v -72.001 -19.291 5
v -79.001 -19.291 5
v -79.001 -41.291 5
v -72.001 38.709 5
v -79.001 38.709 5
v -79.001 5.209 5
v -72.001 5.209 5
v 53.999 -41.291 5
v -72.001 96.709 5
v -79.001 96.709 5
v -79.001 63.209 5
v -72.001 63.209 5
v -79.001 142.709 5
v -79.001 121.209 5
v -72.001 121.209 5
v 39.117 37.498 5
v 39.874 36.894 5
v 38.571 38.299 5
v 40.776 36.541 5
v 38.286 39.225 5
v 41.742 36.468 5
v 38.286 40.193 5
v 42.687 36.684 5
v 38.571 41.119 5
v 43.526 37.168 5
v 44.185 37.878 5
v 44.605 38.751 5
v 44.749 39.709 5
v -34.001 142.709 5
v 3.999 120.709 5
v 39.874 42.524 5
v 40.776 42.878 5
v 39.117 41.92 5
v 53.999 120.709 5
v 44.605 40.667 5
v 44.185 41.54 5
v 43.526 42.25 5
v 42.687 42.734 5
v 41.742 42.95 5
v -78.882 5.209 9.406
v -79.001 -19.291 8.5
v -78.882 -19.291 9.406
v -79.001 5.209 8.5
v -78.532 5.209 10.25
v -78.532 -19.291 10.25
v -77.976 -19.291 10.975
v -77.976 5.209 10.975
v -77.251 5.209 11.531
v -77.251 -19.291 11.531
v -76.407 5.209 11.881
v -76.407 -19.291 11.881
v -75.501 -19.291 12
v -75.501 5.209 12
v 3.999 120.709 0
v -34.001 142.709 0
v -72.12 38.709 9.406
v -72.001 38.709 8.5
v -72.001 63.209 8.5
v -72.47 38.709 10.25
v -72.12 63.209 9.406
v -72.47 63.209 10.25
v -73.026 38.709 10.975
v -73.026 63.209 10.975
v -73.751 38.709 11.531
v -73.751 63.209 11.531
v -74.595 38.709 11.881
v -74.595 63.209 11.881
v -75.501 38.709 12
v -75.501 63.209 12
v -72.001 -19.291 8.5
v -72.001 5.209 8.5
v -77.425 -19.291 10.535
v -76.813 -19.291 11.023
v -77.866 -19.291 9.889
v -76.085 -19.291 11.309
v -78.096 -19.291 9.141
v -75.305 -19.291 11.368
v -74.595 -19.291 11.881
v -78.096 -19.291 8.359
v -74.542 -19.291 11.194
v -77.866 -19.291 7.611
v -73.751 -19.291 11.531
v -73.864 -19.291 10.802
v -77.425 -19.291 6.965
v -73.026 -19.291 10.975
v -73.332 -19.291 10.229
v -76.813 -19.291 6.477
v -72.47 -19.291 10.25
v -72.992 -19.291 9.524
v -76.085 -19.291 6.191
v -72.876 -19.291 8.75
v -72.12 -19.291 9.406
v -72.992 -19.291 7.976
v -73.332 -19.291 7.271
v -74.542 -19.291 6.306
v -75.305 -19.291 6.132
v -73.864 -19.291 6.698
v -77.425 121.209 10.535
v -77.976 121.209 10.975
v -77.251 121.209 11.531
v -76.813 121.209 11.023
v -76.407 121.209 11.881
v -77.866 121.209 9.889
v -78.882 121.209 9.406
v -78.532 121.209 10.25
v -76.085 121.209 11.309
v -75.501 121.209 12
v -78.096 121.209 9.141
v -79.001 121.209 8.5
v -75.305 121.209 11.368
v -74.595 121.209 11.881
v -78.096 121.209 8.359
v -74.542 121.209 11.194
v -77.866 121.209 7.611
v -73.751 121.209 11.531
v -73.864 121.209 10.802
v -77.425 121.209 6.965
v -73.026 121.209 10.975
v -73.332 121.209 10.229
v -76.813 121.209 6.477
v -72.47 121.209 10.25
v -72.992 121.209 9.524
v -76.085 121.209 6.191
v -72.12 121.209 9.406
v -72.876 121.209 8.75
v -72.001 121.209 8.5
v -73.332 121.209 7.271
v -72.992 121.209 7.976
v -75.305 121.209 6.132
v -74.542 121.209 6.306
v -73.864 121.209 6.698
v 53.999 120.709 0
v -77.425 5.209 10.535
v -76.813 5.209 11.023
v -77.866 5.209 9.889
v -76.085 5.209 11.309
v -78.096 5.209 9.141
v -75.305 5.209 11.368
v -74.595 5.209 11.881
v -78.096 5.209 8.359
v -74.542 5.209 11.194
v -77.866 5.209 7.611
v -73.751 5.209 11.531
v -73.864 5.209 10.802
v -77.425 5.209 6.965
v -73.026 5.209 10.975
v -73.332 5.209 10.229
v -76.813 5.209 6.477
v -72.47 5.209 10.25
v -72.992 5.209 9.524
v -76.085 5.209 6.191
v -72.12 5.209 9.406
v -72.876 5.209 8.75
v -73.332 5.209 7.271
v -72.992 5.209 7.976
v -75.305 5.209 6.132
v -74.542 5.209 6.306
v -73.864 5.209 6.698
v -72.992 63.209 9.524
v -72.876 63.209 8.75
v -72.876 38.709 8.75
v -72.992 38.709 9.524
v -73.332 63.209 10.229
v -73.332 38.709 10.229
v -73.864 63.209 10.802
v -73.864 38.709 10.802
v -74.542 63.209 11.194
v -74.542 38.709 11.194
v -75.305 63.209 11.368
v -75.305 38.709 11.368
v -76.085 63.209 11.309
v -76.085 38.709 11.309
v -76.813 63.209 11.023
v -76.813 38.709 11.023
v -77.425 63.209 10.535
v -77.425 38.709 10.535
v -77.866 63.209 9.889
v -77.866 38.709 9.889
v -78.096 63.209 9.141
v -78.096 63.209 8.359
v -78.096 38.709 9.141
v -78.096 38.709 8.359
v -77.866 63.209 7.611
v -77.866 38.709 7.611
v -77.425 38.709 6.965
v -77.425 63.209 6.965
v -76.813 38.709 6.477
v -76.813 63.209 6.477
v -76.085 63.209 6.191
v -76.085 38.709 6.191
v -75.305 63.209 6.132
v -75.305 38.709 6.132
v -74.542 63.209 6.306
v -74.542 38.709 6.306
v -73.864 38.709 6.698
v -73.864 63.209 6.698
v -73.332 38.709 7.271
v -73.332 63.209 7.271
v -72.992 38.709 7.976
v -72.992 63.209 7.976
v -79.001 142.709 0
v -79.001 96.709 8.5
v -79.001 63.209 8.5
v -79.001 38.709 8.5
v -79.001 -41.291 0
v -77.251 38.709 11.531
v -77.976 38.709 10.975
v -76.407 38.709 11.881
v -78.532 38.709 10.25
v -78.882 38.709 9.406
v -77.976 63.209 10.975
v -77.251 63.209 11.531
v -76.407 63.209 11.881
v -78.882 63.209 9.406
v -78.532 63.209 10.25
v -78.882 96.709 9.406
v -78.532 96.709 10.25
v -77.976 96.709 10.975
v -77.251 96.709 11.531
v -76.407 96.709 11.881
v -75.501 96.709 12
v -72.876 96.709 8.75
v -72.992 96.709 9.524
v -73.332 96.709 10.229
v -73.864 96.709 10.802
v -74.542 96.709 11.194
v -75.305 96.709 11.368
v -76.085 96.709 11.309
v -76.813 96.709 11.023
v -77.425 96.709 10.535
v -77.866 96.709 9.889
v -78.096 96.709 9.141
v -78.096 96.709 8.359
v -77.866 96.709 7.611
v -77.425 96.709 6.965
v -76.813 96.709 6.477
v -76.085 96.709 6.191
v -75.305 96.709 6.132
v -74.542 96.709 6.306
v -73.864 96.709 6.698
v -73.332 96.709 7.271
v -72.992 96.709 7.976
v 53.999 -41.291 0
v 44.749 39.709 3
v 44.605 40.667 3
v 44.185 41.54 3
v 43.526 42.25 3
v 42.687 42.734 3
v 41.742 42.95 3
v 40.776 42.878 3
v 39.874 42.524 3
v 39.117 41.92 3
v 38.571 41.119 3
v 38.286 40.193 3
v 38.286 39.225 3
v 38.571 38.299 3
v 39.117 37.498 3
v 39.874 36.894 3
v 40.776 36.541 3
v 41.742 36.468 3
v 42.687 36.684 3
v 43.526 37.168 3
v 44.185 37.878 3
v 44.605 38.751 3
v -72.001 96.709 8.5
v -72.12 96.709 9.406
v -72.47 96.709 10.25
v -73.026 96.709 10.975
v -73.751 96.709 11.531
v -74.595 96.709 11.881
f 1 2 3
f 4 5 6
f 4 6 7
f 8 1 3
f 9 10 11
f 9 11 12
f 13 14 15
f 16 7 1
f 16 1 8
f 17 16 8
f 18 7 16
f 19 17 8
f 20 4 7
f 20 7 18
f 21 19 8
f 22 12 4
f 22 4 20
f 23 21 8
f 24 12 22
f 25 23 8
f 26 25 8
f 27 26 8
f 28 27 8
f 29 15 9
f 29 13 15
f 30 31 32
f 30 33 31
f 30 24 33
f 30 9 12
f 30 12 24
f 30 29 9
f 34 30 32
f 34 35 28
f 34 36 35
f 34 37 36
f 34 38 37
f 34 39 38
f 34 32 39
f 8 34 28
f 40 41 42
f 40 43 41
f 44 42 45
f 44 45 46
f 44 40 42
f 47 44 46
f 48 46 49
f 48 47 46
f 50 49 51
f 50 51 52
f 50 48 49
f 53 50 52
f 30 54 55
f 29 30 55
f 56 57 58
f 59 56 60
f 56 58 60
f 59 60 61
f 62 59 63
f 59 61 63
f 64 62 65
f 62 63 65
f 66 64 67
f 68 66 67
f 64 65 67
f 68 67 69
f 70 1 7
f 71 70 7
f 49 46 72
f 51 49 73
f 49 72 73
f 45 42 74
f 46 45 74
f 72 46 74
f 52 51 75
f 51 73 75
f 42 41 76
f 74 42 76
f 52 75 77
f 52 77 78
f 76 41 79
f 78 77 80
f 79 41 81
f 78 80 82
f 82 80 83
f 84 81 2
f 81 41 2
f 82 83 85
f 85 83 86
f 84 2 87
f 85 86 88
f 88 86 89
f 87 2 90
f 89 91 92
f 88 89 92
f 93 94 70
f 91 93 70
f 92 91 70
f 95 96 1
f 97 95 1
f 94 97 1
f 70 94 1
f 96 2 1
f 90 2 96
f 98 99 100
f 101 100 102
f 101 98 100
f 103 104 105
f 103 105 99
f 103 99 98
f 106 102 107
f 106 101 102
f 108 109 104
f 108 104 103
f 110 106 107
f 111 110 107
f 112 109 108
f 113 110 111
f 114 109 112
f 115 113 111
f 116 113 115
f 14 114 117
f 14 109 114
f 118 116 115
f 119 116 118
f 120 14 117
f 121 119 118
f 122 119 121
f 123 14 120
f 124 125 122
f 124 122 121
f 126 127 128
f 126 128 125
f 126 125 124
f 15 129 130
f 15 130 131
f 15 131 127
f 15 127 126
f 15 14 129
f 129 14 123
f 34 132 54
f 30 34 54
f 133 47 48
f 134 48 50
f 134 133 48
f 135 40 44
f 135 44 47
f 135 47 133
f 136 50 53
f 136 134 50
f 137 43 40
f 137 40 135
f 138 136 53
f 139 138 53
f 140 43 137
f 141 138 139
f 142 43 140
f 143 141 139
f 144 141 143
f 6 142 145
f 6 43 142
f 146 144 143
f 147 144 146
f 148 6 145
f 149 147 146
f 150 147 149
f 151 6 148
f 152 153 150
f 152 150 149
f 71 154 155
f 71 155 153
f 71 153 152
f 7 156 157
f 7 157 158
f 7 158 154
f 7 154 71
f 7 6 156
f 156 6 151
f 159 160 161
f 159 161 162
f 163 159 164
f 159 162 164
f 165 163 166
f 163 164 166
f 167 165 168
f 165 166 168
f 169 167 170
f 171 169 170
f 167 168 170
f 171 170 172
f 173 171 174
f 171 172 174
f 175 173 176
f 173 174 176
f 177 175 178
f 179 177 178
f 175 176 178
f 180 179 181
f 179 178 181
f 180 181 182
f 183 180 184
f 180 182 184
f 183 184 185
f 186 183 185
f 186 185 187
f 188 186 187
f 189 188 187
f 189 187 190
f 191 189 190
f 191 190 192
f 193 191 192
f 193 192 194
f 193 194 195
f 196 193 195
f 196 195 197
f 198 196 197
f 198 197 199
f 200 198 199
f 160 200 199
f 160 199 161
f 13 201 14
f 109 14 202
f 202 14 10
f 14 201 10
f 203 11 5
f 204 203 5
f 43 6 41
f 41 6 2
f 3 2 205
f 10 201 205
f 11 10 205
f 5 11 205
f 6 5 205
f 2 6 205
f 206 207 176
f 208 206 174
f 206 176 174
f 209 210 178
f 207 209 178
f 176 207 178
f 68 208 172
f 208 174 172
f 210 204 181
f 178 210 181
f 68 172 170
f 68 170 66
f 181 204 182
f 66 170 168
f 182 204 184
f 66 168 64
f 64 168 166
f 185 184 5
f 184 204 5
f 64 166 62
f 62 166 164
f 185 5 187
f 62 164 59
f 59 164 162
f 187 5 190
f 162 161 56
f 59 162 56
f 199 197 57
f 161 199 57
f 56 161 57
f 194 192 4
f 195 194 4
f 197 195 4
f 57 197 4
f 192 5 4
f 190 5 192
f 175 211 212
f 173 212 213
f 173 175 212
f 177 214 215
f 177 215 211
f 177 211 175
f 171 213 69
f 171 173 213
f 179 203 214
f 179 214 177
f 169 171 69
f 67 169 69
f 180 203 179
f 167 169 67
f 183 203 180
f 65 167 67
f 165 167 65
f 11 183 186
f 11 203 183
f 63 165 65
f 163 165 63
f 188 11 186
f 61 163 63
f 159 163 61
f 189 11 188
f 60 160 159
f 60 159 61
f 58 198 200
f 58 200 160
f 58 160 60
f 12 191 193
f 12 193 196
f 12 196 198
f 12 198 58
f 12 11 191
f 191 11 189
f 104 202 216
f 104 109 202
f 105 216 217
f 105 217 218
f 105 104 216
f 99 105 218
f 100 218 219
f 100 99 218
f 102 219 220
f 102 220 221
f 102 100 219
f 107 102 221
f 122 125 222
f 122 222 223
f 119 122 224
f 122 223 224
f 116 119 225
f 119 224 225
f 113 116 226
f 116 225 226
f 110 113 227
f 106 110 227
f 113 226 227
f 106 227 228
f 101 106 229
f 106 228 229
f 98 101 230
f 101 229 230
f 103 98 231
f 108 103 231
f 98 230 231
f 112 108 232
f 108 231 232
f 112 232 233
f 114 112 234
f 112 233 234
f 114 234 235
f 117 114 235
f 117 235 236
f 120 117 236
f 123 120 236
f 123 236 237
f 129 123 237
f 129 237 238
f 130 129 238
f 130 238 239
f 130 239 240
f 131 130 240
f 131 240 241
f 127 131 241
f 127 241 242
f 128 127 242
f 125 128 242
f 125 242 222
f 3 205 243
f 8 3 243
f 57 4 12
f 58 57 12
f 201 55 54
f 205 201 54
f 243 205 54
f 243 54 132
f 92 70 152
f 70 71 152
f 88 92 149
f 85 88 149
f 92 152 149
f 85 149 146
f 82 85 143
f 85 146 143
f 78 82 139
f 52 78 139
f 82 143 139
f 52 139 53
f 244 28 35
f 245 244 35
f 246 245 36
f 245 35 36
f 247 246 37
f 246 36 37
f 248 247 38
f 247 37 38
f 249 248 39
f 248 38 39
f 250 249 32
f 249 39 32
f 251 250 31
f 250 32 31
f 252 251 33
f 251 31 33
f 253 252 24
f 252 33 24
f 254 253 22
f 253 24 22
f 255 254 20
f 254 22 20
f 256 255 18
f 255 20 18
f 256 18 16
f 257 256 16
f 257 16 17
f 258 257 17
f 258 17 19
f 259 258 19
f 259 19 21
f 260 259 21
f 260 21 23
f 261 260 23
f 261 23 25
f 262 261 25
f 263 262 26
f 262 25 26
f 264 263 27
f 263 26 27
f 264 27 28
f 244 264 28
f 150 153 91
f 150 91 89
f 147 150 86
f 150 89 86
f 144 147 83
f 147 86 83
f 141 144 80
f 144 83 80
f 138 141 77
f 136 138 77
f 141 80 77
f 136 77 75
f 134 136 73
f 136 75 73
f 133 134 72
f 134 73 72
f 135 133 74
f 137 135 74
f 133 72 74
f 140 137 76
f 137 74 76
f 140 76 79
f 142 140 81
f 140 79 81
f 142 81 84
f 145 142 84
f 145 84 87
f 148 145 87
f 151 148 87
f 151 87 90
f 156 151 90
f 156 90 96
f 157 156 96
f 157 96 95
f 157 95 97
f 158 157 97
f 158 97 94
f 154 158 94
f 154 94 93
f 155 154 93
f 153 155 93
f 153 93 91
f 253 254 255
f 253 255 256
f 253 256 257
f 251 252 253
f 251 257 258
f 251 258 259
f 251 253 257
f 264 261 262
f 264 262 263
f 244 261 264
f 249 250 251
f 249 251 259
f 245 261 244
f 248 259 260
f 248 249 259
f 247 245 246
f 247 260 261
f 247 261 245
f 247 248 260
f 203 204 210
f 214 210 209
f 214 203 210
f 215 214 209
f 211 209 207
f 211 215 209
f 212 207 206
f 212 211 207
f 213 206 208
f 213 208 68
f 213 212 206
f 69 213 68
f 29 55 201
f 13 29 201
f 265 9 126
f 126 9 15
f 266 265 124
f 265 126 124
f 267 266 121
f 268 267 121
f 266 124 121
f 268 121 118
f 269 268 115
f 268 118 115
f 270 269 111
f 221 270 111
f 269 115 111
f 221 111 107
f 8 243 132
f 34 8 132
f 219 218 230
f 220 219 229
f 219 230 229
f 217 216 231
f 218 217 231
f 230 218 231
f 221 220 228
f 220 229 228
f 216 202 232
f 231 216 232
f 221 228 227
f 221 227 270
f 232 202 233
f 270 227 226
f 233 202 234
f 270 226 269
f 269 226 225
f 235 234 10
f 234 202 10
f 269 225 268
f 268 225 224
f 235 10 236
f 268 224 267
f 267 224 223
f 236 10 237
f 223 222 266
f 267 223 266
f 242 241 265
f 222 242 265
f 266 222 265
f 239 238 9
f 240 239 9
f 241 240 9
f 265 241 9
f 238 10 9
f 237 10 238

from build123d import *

# Parameters (mm, degrees)
F0_W     = 7
F0_H     = 24.5
F1_DEPTH = 5
F2_W     = 7
F2_H     = 24.5
F3_DEPTH = 7
F4_R     = 3.49999
F5_R     = 2.625
F6_DEPTH = 162.001
F7_R     = 3.25
F8_DEPTH = 2


# Not quite as in the source:
# - a fillet or chamfer is up to 0.001 mm smaller than in the source, because OpenCascade refuses the exact size


with BuildPart() as f1:
    # F0 (on Top) → F1 (new body)
    with BuildSketch(Plane.XY):
        Polygon((-34.0007612563, 142.7090217992), (-79.0007612563, 142.7090217992), (-79.0007612563, 121.2090217992), (-72.0007612563, 121.2090217992), (-72.0007612563, 96.7090217992), (-79.0007612563, 96.7090217992), (-79.0007612563, 63.2090217992), (-72.0007612563, 63.2090217992), (-72.0007612563, 38.7090217992), (-79.0007612563, 38.7090217992), (-79.0007612563, 5.2090217992), (-72.0007612563, 5.2090217992), (-72.0007612563, -19.2909782008), (-79.0007612563, -19.2909782008), (-79.0007612563, -41.2909782008), (53.9992387437, -41.2909782008), (53.9992387437, 120.7090218186), (3.9992387437, 120.7090218186), align=None)
        with Locations((-75.5007612563, 108.9590217992)):
            Rectangle(F0_W, F0_H)
        with Locations((-75.5007612563, 50.9590217992)):
            Rectangle(F0_W, F0_H)
        with Locations((-75.5007612563, -7.0409782008)):
            Rectangle(F0_W, F0_H)
    extrude(amount=F1_DEPTH)

    # F2 (on face) → F3 (join)
    with BuildSketch(Plane.XY.offset(5)):
        with Locations((-75.5007612563, 108.9590217992)):
            Rectangle(F2_W, F2_H)
        with Locations((-75.5007612563, 50.9590217992)):
            Rectangle(F2_W, F2_H)
        with Locations((-75.5007612563, -7.0409782008)):
            Rectangle(F2_W, F2_H)
    extrude(amount=F3_DEPTH)

    # F4 (radius 3.5 in the source; OpenCascade refuses exactly that, so slightly less here)
    f4_edges = [f1.edges().sort_by_distance(p)[0] for p in [
        (-72.000761, 108.959022, 12),
        (-72.000761, 50.959022, 12),
        (-79.000761, 50.959022, 12),
        (-79.000761, 108.959022, 12),
        (-72.000761, -7.040978, 12),
        (-79.000761, -7.040978, 12),
    ]]
    fillet(f4_edges, radius=F4_R)

    # F5 (on face) → F6 (cut, through all)
    with BuildSketch(Plane.XZ.offset(19.2909782008)):
        with Locations((-75.5007612563, 8.75)):
            Circle(F5_R)
    extrude(amount=-F6_DEPTH, mode=Mode.SUBTRACT)

    # F7 (on face) → F8 (cut)
    with BuildSketch(Plane.XY.offset(5)):
        with Locations((41.4992387437, 39.7090218089)):
            Circle(F7_R)
    extrude(amount=-F8_DEPTH, mode=Mode.SUBTRACT)


solid = f1.part
